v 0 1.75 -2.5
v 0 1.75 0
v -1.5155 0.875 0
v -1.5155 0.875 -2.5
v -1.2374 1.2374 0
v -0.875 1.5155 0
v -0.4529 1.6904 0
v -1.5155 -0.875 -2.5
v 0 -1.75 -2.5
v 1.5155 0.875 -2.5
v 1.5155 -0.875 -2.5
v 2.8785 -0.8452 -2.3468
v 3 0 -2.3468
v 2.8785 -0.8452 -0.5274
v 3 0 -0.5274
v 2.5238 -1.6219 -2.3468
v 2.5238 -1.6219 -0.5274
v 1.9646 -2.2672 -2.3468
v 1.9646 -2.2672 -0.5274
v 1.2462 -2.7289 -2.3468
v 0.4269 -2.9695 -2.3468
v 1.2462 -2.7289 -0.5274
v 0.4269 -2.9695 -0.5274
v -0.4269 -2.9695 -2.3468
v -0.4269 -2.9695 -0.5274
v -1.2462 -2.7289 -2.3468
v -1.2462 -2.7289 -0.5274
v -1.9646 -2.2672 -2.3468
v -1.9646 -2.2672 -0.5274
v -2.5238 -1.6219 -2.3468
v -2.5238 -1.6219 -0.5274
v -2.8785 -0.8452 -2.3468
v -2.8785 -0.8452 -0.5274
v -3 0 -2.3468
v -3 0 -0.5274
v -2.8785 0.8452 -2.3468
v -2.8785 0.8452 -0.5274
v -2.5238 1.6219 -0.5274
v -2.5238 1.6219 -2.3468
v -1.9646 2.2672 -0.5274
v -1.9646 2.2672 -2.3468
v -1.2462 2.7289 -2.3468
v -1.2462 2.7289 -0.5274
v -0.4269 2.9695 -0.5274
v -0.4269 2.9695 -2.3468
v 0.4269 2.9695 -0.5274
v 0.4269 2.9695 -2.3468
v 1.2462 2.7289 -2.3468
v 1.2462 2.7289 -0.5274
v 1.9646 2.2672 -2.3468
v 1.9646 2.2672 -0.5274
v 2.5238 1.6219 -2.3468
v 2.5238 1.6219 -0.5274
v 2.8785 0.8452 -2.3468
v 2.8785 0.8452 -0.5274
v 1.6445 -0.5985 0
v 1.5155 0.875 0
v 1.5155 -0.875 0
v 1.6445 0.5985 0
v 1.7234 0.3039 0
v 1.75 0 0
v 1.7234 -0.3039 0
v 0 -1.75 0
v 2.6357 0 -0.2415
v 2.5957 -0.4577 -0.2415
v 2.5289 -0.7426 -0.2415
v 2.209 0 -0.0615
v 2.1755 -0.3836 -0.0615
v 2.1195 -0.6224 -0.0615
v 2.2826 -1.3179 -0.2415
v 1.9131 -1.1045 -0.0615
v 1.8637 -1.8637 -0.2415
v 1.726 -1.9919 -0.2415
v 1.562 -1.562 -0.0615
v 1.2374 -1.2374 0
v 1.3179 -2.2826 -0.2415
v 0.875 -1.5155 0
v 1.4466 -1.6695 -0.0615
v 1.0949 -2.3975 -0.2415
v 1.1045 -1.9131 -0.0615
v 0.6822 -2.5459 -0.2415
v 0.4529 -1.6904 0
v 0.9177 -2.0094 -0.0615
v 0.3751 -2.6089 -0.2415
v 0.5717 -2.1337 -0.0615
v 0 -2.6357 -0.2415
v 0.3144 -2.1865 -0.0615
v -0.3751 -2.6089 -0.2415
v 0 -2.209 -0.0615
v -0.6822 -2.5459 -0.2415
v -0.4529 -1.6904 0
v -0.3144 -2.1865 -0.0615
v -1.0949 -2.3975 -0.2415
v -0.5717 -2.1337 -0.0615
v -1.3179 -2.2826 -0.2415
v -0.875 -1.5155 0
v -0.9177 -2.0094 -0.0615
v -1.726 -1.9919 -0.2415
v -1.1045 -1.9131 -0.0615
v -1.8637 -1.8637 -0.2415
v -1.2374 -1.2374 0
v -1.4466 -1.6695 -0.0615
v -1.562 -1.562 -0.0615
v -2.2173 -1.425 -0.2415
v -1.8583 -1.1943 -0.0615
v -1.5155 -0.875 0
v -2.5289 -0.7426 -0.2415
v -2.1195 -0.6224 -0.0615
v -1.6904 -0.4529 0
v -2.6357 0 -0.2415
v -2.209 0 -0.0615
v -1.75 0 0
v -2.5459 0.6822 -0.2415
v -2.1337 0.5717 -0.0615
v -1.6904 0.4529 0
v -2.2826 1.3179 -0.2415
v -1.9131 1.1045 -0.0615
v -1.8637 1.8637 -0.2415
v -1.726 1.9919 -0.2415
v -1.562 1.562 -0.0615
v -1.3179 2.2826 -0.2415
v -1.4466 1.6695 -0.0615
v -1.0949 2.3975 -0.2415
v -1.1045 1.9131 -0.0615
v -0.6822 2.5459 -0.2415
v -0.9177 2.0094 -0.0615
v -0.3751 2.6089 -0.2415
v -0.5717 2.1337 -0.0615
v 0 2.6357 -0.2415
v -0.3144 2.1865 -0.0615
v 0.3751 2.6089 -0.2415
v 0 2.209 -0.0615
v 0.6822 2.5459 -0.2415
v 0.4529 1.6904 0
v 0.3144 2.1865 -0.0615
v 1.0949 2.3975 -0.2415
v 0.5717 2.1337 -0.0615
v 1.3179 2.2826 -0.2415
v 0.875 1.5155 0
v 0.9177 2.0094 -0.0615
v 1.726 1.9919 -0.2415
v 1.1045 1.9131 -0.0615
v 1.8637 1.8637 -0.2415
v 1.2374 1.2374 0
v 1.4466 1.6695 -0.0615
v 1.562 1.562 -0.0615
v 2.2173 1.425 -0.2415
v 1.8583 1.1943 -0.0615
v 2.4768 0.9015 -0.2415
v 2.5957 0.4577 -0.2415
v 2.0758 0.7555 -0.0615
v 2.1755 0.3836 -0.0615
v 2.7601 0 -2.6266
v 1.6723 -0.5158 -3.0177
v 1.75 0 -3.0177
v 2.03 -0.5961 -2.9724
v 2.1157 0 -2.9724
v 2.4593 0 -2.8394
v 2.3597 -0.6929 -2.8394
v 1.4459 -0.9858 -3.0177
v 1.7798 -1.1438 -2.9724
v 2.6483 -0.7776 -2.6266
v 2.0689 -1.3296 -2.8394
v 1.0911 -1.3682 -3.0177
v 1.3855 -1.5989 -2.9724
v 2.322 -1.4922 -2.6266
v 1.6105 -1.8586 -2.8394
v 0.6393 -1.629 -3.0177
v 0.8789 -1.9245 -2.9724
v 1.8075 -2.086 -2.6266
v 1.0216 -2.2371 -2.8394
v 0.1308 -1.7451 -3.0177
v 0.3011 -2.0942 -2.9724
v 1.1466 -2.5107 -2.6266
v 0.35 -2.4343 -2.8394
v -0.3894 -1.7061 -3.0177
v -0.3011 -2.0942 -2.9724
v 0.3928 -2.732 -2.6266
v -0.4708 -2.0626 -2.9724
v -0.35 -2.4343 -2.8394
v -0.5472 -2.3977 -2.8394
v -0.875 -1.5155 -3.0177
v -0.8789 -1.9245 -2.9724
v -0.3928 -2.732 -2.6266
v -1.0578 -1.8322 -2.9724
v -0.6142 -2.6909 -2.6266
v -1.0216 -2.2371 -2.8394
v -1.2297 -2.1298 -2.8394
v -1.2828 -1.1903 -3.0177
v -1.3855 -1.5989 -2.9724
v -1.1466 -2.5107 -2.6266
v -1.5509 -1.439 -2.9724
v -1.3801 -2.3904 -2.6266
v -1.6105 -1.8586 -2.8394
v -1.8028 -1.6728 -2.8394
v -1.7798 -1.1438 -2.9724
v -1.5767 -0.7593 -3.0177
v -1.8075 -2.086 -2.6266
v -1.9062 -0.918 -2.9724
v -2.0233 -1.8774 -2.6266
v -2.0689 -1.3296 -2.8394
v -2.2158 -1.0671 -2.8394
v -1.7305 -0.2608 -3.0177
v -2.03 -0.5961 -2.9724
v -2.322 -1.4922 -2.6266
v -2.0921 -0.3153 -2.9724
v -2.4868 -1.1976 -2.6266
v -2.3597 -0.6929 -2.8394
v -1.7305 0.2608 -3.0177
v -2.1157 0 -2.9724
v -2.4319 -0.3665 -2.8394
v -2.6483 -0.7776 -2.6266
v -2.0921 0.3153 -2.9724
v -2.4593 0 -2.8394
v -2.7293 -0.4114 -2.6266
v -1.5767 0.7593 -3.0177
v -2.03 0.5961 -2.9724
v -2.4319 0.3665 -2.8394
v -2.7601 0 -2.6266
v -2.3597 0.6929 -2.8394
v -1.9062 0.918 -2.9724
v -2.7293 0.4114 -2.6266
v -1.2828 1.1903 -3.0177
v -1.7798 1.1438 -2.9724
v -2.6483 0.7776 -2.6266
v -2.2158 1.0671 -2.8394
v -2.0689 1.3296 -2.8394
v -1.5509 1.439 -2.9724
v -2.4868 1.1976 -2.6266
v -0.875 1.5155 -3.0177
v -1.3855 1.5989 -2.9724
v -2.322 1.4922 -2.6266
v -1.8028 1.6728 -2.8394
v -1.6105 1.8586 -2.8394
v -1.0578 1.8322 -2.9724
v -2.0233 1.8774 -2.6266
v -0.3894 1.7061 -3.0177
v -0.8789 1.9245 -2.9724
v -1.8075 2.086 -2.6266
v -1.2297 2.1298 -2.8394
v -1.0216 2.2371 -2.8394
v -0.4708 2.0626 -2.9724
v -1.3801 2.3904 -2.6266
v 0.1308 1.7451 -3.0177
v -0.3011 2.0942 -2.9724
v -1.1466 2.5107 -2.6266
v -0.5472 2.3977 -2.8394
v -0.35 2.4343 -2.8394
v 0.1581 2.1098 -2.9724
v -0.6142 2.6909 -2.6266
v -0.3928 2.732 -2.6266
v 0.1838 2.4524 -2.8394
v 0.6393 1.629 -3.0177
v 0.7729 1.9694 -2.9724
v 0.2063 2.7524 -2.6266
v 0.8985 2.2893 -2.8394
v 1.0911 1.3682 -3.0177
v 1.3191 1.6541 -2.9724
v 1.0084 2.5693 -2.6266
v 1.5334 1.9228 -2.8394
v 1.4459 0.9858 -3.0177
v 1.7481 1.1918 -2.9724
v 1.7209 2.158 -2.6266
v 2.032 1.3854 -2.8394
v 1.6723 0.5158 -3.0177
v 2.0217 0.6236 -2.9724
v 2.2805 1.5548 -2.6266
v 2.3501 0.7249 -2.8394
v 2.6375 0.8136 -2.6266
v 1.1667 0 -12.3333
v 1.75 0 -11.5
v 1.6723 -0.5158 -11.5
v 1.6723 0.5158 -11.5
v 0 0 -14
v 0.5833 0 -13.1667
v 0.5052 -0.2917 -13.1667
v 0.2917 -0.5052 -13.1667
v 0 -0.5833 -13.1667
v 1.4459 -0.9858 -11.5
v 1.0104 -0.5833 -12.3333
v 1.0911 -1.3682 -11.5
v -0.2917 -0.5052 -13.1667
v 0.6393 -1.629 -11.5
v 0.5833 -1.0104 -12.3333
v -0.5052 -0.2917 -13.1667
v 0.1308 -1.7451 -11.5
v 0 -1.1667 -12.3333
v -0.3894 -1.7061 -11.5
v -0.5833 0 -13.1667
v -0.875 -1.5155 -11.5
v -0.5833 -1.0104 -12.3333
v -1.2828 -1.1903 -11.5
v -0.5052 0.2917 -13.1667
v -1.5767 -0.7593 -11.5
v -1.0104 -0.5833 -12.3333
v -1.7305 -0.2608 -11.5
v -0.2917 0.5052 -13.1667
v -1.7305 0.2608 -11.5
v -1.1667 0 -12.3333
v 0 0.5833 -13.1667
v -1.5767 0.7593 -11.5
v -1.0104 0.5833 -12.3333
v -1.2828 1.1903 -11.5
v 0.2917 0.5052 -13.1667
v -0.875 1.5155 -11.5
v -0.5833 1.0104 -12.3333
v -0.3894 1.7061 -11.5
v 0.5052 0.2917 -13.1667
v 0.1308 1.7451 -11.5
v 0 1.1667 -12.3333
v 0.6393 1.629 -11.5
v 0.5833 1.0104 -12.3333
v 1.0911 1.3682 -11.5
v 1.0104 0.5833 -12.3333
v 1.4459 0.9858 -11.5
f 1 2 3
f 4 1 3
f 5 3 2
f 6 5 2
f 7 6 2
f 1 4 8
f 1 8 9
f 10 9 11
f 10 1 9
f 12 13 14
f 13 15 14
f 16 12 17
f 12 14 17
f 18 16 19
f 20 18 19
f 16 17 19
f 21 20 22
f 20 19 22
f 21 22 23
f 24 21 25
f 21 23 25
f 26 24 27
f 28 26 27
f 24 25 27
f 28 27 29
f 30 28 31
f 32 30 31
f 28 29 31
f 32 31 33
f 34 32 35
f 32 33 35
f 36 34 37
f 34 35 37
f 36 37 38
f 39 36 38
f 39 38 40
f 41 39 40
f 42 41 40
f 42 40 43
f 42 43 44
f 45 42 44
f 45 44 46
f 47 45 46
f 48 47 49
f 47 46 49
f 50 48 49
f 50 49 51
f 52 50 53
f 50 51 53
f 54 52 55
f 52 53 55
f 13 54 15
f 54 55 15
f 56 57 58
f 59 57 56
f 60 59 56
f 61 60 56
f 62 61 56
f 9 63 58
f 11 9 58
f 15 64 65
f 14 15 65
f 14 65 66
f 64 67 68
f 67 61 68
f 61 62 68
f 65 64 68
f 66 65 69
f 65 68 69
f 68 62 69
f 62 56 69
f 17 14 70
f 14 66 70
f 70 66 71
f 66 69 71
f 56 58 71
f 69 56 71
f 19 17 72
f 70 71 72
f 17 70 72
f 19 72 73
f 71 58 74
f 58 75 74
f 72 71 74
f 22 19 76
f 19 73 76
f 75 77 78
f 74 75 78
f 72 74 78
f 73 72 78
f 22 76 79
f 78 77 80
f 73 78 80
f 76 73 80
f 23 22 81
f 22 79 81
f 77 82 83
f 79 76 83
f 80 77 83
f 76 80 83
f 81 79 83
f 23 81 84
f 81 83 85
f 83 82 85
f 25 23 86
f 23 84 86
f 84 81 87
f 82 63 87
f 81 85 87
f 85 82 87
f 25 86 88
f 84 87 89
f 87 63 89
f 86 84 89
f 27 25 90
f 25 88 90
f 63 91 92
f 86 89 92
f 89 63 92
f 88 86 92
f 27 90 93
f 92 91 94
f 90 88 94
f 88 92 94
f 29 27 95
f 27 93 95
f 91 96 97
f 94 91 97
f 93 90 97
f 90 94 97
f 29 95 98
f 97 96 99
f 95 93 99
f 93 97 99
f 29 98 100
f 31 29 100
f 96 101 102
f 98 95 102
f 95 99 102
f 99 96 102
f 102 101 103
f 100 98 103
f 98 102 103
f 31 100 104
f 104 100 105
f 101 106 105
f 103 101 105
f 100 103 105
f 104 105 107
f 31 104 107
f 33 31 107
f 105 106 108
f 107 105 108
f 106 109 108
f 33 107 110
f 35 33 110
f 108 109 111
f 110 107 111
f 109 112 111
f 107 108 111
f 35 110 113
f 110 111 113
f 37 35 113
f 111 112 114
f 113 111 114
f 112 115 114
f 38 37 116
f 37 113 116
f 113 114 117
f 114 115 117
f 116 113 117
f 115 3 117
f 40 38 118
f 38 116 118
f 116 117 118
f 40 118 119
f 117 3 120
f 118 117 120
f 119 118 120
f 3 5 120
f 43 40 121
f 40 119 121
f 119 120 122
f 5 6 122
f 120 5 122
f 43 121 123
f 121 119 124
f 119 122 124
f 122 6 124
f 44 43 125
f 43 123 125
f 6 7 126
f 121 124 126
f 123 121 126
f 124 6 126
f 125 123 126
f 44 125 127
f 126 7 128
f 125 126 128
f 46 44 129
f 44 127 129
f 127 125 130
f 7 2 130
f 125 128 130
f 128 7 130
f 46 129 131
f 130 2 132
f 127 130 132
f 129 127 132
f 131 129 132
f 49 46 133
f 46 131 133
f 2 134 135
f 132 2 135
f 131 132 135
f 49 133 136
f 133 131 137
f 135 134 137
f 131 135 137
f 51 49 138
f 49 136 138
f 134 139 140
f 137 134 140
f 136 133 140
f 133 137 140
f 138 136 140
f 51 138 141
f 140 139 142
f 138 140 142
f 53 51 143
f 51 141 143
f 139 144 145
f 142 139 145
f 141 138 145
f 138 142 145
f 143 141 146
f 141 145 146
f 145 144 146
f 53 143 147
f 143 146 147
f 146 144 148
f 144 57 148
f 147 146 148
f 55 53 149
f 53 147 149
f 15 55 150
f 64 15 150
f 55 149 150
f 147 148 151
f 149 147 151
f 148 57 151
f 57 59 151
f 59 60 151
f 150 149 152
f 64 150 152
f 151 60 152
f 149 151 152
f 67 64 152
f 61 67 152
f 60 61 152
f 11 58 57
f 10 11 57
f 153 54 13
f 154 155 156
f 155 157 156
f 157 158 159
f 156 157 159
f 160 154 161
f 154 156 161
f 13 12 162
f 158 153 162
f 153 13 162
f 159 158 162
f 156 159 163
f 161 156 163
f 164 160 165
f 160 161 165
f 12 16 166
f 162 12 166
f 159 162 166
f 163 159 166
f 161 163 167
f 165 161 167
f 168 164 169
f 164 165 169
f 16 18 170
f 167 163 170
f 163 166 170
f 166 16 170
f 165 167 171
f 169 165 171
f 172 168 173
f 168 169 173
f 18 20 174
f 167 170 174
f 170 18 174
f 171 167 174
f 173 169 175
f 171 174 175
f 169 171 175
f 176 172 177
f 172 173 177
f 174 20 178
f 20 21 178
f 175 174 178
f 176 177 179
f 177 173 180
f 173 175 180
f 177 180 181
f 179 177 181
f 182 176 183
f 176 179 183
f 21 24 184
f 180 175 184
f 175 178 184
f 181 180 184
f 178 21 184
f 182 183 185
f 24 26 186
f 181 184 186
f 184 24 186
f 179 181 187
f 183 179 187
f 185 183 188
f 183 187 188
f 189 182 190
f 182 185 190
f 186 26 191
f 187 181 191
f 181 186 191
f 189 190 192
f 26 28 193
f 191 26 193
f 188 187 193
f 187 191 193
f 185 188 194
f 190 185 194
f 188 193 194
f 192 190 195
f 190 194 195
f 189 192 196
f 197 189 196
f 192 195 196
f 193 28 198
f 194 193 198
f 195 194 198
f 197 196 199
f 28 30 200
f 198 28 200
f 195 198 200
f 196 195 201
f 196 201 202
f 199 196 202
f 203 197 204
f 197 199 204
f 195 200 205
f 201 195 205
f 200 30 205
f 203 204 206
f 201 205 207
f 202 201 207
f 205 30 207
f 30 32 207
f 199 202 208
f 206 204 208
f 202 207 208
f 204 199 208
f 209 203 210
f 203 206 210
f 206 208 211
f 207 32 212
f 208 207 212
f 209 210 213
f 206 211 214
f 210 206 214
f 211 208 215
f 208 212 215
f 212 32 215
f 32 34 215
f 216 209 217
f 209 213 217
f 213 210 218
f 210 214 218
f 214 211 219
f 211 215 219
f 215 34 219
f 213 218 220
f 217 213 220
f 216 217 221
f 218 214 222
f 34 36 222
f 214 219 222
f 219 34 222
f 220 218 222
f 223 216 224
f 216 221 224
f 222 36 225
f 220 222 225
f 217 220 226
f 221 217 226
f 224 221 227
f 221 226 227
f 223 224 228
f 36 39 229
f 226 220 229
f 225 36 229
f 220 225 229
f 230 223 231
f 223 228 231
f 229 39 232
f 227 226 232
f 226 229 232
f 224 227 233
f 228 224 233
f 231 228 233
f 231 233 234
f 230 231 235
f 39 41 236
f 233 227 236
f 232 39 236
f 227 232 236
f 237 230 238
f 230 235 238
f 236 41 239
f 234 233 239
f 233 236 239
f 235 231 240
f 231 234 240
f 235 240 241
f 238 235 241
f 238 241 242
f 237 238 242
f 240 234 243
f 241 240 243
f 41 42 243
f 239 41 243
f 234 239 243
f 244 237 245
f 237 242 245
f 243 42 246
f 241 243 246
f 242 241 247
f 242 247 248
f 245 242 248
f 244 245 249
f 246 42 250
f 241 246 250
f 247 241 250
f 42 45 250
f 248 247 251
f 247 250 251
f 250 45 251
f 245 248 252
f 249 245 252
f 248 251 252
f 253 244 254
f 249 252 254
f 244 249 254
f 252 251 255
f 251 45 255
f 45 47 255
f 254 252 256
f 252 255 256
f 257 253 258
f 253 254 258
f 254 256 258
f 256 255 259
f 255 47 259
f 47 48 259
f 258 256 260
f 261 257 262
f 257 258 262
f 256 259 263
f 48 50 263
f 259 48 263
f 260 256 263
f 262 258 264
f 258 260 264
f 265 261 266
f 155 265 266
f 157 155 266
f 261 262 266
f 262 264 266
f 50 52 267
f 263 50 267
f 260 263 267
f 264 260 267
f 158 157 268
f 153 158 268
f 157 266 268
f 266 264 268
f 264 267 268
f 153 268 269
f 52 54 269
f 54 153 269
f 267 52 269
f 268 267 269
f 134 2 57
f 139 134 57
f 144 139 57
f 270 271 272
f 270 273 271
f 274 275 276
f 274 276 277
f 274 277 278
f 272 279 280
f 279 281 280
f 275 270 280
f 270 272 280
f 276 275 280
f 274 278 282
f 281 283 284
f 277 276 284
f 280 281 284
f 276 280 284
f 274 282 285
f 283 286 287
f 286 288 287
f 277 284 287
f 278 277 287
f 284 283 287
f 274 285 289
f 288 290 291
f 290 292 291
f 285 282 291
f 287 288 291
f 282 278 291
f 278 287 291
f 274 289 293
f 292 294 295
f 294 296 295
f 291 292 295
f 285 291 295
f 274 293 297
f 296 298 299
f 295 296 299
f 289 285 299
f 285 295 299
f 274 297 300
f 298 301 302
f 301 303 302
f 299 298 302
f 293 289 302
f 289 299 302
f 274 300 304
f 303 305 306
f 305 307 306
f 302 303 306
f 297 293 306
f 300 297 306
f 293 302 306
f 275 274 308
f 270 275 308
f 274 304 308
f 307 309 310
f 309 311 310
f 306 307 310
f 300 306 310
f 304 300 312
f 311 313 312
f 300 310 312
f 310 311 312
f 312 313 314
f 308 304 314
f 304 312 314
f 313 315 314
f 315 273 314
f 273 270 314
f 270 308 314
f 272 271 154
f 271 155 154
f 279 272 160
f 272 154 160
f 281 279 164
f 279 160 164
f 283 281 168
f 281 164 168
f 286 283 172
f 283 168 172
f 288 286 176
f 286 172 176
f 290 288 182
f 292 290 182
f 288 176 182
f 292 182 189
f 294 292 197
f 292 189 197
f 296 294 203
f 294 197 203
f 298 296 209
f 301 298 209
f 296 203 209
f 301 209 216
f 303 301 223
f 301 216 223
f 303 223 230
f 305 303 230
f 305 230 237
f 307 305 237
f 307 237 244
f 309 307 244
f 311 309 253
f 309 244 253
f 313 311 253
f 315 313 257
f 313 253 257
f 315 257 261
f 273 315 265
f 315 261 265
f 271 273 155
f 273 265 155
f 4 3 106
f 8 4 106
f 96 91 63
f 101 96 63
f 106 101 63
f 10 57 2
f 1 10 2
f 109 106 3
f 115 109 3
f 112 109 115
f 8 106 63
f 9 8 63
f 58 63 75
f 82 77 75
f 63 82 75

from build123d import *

# Parameters (mm, degrees)
CUT_EXTRUDE1_DEPTH = 2.5


with BuildPart() as part:
    # Sketch1 → Revolve1 (revolve)
    with BuildSketch(Plane(origin=(0, 0, 0), x_dir=(0, 0, -1), z_dir=(1, 0, 0)), mode=Mode.PRIVATE) as revolve1_sk:
        with BuildLine():
            Line((0, 0), (14, 0))
            Line((14, 0), (11.5, 1.75))
            Line((11.5, 1.75), (3.017689414, 1.75))
            ThreePointArc((3.017689414, 1.75), (2.839380432, 2.459318583), (2.346845612, 3))
            Line((2.346845612, 3), (0.527441756, 3))
            ThreePointArc((0.527441756, 3), (0.137258951, 2.428361041), (0, 1.75))
            Line((0, 1.75), (0, 0))
        make_face()
    revolve(revolve1_sk.sketch.rotate(Axis((0, 0, 0), (0, 0, -1)), 90), axis=Axis((0, 0, 0), (0, 0, -1)))

    # Sketch7 → Cut-Extrude1 (cut)
    with BuildSketch(Plane.XY):
        Polygon((-1.515544457, 0.875), (-1.515544457, -0.875), (0, -1.75), (1.515544457, -0.875), (1.515544457, 0.875), (0, 1.75), align=None)
    extrude(amount=-CUT_EXTRUDE1_DEPTH, mode=Mode.SUBTRACT)


solid = part.part
